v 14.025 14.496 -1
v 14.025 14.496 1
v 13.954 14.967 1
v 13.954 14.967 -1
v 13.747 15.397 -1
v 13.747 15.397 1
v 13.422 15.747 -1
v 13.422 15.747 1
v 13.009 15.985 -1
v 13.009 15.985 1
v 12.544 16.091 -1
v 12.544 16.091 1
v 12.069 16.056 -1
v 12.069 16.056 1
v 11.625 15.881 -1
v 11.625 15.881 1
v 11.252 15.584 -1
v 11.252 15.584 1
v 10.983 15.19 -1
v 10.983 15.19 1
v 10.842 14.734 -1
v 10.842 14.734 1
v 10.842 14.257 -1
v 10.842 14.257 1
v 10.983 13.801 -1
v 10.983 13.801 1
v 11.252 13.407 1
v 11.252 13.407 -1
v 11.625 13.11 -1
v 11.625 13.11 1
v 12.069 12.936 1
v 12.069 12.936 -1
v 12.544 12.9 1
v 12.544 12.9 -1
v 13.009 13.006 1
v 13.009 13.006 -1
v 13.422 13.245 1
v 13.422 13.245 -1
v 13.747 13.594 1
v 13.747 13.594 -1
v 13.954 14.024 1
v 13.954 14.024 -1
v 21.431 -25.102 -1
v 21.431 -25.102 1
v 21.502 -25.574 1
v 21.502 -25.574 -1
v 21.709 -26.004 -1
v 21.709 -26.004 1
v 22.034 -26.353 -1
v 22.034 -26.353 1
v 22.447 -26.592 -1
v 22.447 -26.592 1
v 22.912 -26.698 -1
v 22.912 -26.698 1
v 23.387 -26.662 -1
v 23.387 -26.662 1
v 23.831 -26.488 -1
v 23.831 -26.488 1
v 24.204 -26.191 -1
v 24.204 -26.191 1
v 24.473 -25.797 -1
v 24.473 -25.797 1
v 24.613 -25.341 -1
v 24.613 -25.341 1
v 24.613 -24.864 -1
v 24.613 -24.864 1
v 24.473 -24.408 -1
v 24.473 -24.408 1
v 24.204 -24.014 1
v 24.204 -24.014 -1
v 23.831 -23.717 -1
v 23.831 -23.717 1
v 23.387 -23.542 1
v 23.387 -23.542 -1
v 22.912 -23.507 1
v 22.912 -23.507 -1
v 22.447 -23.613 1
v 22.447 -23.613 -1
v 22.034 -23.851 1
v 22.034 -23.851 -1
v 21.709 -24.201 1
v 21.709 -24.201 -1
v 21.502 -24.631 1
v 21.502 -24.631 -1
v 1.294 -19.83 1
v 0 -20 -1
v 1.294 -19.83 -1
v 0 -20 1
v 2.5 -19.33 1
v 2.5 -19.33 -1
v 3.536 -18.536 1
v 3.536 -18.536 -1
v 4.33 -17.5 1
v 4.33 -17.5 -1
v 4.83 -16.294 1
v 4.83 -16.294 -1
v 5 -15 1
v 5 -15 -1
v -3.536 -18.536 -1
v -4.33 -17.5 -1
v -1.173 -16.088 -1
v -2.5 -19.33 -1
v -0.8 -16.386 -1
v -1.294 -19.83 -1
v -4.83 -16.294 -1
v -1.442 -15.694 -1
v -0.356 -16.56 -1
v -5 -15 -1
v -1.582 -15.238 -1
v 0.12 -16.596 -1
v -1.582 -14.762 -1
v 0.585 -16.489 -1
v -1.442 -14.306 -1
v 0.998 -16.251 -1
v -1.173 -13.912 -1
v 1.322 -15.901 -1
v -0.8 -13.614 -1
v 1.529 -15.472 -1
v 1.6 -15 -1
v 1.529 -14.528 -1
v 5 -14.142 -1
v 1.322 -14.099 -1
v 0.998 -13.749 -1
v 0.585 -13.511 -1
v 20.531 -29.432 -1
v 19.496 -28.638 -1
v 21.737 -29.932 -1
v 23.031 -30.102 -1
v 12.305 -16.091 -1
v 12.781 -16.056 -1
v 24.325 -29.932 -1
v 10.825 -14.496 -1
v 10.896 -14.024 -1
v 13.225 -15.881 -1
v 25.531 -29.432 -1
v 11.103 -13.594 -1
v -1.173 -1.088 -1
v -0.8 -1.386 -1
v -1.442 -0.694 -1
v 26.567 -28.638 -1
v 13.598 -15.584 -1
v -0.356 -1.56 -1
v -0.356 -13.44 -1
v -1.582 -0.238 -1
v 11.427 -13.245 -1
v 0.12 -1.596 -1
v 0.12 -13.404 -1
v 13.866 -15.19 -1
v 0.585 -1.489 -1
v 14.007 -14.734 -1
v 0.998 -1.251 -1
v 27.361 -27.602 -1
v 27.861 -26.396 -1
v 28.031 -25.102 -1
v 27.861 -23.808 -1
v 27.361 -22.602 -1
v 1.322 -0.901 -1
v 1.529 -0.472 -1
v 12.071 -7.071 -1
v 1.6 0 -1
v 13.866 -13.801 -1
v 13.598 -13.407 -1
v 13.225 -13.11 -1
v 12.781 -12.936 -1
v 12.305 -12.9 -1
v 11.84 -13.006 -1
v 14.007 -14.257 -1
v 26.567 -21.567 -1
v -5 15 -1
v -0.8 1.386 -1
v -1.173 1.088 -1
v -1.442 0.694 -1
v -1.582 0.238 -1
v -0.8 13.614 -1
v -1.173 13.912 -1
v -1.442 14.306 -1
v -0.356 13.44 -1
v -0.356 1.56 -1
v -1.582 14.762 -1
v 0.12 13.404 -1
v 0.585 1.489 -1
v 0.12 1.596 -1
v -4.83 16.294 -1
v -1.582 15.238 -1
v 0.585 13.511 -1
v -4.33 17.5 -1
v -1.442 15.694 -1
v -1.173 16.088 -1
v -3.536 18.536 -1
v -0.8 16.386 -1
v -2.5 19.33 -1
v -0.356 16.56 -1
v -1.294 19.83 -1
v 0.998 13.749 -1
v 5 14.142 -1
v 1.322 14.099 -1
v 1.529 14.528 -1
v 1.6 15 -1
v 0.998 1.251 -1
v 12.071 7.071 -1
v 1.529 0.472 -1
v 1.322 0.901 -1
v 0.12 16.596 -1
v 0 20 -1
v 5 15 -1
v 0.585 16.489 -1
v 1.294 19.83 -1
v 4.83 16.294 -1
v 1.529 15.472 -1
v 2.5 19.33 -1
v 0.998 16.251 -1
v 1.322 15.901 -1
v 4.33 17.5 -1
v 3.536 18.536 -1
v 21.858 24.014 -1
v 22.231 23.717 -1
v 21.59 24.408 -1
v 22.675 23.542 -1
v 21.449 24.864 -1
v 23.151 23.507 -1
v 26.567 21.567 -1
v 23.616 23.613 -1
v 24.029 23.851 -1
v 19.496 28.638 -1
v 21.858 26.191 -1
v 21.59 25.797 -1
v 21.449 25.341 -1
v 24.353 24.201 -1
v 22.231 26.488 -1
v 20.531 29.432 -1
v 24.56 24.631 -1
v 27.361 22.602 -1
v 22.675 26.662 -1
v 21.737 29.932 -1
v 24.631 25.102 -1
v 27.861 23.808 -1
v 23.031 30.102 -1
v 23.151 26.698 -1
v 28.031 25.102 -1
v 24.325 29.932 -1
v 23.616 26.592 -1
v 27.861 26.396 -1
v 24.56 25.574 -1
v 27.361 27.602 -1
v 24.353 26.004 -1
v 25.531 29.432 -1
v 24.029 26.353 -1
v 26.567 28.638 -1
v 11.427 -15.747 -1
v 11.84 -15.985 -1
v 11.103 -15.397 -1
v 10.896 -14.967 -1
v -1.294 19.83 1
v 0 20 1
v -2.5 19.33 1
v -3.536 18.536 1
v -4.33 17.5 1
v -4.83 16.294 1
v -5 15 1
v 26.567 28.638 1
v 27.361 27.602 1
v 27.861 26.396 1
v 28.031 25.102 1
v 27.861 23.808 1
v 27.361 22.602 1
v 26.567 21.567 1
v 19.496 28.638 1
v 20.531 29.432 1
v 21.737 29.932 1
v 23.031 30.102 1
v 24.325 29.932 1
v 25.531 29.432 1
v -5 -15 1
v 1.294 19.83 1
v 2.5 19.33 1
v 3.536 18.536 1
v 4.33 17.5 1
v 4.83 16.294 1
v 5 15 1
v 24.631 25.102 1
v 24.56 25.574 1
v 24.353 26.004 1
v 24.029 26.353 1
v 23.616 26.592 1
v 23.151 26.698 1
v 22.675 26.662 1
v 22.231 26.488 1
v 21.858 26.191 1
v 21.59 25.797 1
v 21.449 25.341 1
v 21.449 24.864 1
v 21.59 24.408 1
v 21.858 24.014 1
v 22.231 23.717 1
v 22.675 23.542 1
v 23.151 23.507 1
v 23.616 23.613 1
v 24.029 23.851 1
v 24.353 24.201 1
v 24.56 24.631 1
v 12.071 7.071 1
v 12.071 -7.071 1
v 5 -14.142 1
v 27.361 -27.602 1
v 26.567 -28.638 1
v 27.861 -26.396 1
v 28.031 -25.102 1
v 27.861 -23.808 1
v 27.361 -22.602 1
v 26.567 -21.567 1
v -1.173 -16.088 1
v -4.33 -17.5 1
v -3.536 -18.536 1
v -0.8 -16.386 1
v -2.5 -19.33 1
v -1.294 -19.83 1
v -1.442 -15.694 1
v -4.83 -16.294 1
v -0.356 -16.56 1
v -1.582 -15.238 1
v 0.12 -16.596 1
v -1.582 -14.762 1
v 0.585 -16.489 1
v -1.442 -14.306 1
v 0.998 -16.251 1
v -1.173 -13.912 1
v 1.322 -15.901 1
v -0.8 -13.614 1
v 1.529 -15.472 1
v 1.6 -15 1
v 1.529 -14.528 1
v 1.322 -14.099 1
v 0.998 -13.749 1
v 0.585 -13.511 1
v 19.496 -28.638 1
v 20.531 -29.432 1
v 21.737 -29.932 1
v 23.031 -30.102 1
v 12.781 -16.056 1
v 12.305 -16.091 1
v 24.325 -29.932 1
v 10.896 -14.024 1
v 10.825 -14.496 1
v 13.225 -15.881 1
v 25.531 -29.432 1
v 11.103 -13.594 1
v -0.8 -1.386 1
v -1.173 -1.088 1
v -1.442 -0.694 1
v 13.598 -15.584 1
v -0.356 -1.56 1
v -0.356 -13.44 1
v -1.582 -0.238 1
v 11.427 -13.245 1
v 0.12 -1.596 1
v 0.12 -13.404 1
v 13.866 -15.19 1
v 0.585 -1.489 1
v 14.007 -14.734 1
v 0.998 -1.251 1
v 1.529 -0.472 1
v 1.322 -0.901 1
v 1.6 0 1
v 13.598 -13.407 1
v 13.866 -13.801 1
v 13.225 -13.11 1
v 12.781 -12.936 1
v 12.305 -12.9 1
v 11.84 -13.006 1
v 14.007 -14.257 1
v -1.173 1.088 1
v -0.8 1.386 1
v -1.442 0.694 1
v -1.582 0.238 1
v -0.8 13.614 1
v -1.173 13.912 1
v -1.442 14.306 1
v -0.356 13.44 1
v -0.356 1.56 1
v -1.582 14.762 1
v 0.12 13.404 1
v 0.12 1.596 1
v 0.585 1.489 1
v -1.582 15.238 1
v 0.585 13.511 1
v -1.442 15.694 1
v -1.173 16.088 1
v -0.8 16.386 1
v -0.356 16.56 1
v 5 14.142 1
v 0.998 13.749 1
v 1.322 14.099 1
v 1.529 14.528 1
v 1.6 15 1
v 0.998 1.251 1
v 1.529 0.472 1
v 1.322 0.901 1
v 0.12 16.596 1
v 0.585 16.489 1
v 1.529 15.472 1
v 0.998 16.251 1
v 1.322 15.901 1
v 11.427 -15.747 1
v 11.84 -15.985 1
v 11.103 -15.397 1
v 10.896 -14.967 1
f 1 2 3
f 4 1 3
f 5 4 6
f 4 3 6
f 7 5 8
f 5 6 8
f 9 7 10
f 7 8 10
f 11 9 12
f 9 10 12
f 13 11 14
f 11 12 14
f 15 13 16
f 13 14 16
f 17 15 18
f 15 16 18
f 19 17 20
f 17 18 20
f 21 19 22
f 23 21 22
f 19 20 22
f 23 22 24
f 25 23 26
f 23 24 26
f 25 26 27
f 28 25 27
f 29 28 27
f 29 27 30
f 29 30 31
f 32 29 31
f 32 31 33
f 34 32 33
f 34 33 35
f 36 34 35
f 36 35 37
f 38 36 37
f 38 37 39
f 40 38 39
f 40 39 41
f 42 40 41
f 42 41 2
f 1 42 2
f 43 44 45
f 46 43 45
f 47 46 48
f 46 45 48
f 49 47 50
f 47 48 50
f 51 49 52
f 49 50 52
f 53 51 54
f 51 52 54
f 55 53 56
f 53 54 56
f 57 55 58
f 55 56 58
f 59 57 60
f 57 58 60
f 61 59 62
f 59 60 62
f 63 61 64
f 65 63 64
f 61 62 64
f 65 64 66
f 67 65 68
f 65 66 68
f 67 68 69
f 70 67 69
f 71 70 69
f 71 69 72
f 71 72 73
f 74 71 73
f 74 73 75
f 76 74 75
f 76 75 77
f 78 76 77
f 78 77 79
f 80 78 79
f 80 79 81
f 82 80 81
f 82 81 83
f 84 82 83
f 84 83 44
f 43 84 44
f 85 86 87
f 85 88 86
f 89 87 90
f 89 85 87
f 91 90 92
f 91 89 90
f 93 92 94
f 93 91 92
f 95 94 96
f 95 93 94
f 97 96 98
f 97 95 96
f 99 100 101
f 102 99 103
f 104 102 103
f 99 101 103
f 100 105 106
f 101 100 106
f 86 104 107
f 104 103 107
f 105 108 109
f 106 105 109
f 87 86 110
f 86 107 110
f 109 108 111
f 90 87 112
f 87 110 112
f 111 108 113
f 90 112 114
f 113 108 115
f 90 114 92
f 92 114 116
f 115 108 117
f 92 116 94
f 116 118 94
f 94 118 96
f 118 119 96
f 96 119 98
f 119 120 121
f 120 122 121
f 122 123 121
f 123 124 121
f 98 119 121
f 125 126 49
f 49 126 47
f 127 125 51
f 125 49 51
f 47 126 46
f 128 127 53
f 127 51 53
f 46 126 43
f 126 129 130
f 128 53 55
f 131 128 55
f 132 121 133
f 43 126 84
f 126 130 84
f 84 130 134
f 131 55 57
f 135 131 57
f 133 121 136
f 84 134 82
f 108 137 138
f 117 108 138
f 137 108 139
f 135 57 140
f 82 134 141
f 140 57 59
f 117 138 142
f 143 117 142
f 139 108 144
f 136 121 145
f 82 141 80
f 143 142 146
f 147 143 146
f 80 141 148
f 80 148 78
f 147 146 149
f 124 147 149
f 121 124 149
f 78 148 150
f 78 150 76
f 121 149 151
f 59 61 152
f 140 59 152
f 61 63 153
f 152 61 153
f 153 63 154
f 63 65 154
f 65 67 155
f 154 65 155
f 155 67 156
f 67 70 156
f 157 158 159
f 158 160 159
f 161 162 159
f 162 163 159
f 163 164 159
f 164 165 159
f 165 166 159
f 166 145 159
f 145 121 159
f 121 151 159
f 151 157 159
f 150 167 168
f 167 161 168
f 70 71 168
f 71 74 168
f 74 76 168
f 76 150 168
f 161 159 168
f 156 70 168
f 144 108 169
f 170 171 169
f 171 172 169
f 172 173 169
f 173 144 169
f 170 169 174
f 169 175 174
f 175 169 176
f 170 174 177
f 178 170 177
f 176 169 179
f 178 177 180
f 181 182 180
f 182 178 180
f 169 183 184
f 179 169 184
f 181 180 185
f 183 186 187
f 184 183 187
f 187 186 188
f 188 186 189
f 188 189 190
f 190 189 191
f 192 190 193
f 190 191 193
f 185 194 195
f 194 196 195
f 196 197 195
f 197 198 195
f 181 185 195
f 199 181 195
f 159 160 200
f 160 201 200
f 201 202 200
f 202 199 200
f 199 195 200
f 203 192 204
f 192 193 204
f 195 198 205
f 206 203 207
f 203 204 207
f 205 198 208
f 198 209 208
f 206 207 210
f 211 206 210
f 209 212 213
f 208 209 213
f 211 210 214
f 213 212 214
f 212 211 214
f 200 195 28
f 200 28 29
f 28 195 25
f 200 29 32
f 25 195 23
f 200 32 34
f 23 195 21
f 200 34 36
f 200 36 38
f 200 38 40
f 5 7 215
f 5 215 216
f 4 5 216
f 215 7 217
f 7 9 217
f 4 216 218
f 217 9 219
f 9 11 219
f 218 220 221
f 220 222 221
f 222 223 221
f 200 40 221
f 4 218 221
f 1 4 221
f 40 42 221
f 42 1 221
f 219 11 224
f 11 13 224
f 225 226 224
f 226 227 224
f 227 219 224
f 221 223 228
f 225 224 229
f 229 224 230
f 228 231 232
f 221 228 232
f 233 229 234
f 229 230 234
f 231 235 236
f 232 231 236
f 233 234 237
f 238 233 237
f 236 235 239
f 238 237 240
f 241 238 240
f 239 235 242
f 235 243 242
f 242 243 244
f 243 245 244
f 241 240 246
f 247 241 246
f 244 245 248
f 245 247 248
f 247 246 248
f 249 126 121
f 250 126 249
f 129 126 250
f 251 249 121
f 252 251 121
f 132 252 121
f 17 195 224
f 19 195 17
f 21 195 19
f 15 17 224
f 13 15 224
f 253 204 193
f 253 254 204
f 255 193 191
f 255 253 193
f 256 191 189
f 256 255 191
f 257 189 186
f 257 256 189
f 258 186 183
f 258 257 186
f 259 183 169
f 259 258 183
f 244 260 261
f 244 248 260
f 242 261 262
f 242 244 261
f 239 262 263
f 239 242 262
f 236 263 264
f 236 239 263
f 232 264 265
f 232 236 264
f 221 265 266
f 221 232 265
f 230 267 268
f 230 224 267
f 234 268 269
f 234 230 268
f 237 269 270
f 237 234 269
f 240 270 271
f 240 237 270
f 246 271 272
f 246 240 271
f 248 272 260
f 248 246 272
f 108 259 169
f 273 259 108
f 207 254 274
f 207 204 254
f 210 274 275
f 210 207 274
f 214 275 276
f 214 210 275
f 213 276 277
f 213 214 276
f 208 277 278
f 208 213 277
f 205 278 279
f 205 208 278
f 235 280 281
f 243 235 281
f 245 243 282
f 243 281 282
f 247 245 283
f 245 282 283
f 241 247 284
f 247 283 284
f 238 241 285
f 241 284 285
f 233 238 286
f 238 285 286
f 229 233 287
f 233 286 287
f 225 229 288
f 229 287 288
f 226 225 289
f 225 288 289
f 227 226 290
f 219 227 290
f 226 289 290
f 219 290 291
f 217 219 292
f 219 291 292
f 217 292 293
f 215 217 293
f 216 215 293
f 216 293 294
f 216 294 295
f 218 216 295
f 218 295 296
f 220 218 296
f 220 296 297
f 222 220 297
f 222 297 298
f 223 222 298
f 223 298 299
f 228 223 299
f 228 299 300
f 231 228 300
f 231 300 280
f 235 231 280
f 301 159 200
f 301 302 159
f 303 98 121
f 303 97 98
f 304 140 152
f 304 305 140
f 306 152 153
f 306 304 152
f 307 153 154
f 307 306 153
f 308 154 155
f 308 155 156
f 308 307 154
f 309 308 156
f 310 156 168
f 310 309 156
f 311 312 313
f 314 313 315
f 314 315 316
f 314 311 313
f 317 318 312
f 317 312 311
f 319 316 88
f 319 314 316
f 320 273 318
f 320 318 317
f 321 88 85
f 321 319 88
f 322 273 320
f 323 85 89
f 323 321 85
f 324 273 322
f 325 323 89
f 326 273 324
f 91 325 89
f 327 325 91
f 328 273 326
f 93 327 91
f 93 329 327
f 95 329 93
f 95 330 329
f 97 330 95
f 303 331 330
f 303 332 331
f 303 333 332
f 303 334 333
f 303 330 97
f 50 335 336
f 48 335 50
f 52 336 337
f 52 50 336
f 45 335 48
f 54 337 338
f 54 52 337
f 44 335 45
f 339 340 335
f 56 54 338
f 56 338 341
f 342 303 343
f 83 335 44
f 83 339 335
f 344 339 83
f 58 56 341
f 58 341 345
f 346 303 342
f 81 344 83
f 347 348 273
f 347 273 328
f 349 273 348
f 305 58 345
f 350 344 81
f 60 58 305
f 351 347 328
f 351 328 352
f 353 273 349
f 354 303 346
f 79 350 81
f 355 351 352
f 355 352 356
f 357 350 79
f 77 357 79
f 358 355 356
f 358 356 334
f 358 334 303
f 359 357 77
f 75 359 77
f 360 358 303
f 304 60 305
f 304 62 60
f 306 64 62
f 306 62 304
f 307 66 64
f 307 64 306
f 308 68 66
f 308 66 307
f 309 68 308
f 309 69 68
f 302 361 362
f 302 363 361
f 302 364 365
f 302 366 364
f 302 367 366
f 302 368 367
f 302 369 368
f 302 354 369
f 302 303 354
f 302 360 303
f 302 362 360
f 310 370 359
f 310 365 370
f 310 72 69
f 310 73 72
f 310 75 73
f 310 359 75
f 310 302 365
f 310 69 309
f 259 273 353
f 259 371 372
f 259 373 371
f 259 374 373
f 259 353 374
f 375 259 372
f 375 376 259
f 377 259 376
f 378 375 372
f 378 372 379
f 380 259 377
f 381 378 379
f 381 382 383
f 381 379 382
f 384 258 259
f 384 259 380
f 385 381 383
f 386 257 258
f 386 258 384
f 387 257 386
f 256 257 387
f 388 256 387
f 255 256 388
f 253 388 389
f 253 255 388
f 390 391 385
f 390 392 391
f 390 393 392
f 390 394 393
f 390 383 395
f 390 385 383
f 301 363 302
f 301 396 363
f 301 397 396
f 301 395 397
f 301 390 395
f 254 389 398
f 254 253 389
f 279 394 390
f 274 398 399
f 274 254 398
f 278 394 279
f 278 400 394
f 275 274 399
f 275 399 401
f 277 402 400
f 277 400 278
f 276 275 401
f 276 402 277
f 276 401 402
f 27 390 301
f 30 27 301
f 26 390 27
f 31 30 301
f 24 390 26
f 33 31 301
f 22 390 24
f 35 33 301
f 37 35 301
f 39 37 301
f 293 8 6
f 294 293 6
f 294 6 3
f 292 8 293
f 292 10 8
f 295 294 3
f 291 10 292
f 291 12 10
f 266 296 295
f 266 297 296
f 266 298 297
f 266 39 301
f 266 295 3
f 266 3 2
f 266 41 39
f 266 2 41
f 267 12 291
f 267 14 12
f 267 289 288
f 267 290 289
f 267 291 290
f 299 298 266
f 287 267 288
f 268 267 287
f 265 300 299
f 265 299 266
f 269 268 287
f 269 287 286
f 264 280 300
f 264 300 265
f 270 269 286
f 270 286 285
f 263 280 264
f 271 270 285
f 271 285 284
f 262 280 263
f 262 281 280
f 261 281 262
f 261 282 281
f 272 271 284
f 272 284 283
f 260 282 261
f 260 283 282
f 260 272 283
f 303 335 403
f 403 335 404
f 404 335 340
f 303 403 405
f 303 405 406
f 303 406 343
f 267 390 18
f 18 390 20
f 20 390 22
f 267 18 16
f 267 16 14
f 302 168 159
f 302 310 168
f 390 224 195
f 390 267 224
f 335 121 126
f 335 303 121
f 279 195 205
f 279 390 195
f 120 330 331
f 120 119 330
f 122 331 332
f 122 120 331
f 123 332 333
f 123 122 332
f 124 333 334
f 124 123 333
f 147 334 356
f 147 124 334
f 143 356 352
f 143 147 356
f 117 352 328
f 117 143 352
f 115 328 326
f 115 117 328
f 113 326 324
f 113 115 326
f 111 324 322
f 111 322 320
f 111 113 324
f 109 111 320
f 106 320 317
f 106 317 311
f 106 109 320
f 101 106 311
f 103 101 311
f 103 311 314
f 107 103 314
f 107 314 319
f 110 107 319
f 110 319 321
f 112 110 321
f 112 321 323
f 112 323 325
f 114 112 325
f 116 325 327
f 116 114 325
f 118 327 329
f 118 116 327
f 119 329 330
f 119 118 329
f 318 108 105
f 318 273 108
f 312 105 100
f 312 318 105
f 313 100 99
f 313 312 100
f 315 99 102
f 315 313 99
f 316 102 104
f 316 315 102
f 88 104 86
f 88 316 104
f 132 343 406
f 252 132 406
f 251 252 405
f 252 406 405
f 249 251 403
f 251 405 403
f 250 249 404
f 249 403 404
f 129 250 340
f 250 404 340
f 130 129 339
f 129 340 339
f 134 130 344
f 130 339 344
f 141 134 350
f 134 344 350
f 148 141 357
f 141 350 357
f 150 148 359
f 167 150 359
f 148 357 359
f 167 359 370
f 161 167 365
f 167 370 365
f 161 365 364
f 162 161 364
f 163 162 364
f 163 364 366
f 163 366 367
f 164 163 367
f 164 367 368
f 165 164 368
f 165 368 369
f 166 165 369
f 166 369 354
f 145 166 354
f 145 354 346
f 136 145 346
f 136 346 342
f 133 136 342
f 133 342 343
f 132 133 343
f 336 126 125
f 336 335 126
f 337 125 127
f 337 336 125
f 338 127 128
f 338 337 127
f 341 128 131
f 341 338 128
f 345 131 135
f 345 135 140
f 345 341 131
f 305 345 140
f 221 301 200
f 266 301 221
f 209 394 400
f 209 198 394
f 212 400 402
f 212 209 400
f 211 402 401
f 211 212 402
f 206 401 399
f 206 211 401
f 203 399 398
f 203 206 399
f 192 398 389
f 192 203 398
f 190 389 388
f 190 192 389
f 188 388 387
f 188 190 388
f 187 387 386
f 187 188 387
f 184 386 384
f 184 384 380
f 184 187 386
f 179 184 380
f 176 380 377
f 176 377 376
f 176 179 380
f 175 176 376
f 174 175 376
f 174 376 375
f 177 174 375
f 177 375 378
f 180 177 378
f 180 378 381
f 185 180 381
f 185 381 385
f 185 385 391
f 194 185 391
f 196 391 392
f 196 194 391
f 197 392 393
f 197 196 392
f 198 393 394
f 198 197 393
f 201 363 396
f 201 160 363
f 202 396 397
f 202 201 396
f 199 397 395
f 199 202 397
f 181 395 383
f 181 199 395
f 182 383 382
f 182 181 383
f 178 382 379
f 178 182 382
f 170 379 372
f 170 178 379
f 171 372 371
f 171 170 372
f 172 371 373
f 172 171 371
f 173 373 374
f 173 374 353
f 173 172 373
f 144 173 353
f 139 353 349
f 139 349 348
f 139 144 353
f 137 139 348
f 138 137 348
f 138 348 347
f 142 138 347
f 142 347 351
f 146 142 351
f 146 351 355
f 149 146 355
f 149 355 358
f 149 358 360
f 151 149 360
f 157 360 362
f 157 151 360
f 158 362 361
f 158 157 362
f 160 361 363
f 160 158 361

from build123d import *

# Parameters (mm, degrees)
SKETCH_1_R          = 1.6
EXTRUDE_1_DEPTH     = 1
SKETCH_2_R          = 1.6
CUT_EXTRUDE_1_DEPTH = 45.10524807
FILLET_1_R          = 5


with BuildPart() as part:
    # ｽｹｯﾁ1 → ﾎﾞｽ - 押し出し1 (new, symmetric)
    with BuildSketch(Plane.XY):
        Polygon((5, 20), (-5, 20), (-5, -20), (5, -20), (5, -14.142135624), (23.03122292, -32.173358544), (30.102290732, -25.102290732), (12.071067812, -7.071067812), (12.071067812, 7.071067812), (30.102290732, 25.102290732), (23.03122292, 32.173358544), (5, 14.142135624), align=None)
        with Locations((0, -15)):
            Circle(SKETCH_1_R, mode=Mode.SUBTRACT)
        Circle(SKETCH_1_R, mode=Mode.SUBTRACT)
        with Locations((0, 15)):
            Circle(SKETCH_1_R, mode=Mode.SUBTRACT)
    extrude(amount=EXTRUDE_1_DEPTH, both=True)

    # ｽｹｯﾁ2 → ｶｯﾄ - 押し出し1 (cut, through all)
    with BuildSketch(Plane.XY.offset(1)):
        with Locations((12.424621202, 14.495689014)):
            Circle(SKETCH_2_R)
        with Locations((23.03122292, 25.102290732)):
            Circle(SKETCH_2_R)
        with Locations(Location((12.424621202, -14.495689014, 0), (0, 0, 180))):
            Circle(SKETCH_2_R)
        with Locations(Location((23.03122292, -25.102290732, 0), (0, 0, 180))):
            Circle(SKETCH_2_R)
    extrude(amount=-CUT_EXTRUDE_1_DEPTH, mode=Mode.SUBTRACT)

    # ﾌｨﾚｯﾄ1
    fillet_1_edges = [part.edges().sort_by_distance(p)[0] for p in [
        (5, -20, 0),
        (-5, -20, 0),
        (23.03122292, -32.173358544, 0),
        (30.102290732, -25.102290732, 0),
        (30.102290732, 25.102290732, 0),
        (23.03122292, 32.173358544, 0),
        (5, 20, 0),
        (-5, 20, 0),
    ]]
    fillet(fillet_1_edges, radius=FILLET_1_R - 0.0001)  # a hair under: the kernel refuses the full size


solid = part.part
